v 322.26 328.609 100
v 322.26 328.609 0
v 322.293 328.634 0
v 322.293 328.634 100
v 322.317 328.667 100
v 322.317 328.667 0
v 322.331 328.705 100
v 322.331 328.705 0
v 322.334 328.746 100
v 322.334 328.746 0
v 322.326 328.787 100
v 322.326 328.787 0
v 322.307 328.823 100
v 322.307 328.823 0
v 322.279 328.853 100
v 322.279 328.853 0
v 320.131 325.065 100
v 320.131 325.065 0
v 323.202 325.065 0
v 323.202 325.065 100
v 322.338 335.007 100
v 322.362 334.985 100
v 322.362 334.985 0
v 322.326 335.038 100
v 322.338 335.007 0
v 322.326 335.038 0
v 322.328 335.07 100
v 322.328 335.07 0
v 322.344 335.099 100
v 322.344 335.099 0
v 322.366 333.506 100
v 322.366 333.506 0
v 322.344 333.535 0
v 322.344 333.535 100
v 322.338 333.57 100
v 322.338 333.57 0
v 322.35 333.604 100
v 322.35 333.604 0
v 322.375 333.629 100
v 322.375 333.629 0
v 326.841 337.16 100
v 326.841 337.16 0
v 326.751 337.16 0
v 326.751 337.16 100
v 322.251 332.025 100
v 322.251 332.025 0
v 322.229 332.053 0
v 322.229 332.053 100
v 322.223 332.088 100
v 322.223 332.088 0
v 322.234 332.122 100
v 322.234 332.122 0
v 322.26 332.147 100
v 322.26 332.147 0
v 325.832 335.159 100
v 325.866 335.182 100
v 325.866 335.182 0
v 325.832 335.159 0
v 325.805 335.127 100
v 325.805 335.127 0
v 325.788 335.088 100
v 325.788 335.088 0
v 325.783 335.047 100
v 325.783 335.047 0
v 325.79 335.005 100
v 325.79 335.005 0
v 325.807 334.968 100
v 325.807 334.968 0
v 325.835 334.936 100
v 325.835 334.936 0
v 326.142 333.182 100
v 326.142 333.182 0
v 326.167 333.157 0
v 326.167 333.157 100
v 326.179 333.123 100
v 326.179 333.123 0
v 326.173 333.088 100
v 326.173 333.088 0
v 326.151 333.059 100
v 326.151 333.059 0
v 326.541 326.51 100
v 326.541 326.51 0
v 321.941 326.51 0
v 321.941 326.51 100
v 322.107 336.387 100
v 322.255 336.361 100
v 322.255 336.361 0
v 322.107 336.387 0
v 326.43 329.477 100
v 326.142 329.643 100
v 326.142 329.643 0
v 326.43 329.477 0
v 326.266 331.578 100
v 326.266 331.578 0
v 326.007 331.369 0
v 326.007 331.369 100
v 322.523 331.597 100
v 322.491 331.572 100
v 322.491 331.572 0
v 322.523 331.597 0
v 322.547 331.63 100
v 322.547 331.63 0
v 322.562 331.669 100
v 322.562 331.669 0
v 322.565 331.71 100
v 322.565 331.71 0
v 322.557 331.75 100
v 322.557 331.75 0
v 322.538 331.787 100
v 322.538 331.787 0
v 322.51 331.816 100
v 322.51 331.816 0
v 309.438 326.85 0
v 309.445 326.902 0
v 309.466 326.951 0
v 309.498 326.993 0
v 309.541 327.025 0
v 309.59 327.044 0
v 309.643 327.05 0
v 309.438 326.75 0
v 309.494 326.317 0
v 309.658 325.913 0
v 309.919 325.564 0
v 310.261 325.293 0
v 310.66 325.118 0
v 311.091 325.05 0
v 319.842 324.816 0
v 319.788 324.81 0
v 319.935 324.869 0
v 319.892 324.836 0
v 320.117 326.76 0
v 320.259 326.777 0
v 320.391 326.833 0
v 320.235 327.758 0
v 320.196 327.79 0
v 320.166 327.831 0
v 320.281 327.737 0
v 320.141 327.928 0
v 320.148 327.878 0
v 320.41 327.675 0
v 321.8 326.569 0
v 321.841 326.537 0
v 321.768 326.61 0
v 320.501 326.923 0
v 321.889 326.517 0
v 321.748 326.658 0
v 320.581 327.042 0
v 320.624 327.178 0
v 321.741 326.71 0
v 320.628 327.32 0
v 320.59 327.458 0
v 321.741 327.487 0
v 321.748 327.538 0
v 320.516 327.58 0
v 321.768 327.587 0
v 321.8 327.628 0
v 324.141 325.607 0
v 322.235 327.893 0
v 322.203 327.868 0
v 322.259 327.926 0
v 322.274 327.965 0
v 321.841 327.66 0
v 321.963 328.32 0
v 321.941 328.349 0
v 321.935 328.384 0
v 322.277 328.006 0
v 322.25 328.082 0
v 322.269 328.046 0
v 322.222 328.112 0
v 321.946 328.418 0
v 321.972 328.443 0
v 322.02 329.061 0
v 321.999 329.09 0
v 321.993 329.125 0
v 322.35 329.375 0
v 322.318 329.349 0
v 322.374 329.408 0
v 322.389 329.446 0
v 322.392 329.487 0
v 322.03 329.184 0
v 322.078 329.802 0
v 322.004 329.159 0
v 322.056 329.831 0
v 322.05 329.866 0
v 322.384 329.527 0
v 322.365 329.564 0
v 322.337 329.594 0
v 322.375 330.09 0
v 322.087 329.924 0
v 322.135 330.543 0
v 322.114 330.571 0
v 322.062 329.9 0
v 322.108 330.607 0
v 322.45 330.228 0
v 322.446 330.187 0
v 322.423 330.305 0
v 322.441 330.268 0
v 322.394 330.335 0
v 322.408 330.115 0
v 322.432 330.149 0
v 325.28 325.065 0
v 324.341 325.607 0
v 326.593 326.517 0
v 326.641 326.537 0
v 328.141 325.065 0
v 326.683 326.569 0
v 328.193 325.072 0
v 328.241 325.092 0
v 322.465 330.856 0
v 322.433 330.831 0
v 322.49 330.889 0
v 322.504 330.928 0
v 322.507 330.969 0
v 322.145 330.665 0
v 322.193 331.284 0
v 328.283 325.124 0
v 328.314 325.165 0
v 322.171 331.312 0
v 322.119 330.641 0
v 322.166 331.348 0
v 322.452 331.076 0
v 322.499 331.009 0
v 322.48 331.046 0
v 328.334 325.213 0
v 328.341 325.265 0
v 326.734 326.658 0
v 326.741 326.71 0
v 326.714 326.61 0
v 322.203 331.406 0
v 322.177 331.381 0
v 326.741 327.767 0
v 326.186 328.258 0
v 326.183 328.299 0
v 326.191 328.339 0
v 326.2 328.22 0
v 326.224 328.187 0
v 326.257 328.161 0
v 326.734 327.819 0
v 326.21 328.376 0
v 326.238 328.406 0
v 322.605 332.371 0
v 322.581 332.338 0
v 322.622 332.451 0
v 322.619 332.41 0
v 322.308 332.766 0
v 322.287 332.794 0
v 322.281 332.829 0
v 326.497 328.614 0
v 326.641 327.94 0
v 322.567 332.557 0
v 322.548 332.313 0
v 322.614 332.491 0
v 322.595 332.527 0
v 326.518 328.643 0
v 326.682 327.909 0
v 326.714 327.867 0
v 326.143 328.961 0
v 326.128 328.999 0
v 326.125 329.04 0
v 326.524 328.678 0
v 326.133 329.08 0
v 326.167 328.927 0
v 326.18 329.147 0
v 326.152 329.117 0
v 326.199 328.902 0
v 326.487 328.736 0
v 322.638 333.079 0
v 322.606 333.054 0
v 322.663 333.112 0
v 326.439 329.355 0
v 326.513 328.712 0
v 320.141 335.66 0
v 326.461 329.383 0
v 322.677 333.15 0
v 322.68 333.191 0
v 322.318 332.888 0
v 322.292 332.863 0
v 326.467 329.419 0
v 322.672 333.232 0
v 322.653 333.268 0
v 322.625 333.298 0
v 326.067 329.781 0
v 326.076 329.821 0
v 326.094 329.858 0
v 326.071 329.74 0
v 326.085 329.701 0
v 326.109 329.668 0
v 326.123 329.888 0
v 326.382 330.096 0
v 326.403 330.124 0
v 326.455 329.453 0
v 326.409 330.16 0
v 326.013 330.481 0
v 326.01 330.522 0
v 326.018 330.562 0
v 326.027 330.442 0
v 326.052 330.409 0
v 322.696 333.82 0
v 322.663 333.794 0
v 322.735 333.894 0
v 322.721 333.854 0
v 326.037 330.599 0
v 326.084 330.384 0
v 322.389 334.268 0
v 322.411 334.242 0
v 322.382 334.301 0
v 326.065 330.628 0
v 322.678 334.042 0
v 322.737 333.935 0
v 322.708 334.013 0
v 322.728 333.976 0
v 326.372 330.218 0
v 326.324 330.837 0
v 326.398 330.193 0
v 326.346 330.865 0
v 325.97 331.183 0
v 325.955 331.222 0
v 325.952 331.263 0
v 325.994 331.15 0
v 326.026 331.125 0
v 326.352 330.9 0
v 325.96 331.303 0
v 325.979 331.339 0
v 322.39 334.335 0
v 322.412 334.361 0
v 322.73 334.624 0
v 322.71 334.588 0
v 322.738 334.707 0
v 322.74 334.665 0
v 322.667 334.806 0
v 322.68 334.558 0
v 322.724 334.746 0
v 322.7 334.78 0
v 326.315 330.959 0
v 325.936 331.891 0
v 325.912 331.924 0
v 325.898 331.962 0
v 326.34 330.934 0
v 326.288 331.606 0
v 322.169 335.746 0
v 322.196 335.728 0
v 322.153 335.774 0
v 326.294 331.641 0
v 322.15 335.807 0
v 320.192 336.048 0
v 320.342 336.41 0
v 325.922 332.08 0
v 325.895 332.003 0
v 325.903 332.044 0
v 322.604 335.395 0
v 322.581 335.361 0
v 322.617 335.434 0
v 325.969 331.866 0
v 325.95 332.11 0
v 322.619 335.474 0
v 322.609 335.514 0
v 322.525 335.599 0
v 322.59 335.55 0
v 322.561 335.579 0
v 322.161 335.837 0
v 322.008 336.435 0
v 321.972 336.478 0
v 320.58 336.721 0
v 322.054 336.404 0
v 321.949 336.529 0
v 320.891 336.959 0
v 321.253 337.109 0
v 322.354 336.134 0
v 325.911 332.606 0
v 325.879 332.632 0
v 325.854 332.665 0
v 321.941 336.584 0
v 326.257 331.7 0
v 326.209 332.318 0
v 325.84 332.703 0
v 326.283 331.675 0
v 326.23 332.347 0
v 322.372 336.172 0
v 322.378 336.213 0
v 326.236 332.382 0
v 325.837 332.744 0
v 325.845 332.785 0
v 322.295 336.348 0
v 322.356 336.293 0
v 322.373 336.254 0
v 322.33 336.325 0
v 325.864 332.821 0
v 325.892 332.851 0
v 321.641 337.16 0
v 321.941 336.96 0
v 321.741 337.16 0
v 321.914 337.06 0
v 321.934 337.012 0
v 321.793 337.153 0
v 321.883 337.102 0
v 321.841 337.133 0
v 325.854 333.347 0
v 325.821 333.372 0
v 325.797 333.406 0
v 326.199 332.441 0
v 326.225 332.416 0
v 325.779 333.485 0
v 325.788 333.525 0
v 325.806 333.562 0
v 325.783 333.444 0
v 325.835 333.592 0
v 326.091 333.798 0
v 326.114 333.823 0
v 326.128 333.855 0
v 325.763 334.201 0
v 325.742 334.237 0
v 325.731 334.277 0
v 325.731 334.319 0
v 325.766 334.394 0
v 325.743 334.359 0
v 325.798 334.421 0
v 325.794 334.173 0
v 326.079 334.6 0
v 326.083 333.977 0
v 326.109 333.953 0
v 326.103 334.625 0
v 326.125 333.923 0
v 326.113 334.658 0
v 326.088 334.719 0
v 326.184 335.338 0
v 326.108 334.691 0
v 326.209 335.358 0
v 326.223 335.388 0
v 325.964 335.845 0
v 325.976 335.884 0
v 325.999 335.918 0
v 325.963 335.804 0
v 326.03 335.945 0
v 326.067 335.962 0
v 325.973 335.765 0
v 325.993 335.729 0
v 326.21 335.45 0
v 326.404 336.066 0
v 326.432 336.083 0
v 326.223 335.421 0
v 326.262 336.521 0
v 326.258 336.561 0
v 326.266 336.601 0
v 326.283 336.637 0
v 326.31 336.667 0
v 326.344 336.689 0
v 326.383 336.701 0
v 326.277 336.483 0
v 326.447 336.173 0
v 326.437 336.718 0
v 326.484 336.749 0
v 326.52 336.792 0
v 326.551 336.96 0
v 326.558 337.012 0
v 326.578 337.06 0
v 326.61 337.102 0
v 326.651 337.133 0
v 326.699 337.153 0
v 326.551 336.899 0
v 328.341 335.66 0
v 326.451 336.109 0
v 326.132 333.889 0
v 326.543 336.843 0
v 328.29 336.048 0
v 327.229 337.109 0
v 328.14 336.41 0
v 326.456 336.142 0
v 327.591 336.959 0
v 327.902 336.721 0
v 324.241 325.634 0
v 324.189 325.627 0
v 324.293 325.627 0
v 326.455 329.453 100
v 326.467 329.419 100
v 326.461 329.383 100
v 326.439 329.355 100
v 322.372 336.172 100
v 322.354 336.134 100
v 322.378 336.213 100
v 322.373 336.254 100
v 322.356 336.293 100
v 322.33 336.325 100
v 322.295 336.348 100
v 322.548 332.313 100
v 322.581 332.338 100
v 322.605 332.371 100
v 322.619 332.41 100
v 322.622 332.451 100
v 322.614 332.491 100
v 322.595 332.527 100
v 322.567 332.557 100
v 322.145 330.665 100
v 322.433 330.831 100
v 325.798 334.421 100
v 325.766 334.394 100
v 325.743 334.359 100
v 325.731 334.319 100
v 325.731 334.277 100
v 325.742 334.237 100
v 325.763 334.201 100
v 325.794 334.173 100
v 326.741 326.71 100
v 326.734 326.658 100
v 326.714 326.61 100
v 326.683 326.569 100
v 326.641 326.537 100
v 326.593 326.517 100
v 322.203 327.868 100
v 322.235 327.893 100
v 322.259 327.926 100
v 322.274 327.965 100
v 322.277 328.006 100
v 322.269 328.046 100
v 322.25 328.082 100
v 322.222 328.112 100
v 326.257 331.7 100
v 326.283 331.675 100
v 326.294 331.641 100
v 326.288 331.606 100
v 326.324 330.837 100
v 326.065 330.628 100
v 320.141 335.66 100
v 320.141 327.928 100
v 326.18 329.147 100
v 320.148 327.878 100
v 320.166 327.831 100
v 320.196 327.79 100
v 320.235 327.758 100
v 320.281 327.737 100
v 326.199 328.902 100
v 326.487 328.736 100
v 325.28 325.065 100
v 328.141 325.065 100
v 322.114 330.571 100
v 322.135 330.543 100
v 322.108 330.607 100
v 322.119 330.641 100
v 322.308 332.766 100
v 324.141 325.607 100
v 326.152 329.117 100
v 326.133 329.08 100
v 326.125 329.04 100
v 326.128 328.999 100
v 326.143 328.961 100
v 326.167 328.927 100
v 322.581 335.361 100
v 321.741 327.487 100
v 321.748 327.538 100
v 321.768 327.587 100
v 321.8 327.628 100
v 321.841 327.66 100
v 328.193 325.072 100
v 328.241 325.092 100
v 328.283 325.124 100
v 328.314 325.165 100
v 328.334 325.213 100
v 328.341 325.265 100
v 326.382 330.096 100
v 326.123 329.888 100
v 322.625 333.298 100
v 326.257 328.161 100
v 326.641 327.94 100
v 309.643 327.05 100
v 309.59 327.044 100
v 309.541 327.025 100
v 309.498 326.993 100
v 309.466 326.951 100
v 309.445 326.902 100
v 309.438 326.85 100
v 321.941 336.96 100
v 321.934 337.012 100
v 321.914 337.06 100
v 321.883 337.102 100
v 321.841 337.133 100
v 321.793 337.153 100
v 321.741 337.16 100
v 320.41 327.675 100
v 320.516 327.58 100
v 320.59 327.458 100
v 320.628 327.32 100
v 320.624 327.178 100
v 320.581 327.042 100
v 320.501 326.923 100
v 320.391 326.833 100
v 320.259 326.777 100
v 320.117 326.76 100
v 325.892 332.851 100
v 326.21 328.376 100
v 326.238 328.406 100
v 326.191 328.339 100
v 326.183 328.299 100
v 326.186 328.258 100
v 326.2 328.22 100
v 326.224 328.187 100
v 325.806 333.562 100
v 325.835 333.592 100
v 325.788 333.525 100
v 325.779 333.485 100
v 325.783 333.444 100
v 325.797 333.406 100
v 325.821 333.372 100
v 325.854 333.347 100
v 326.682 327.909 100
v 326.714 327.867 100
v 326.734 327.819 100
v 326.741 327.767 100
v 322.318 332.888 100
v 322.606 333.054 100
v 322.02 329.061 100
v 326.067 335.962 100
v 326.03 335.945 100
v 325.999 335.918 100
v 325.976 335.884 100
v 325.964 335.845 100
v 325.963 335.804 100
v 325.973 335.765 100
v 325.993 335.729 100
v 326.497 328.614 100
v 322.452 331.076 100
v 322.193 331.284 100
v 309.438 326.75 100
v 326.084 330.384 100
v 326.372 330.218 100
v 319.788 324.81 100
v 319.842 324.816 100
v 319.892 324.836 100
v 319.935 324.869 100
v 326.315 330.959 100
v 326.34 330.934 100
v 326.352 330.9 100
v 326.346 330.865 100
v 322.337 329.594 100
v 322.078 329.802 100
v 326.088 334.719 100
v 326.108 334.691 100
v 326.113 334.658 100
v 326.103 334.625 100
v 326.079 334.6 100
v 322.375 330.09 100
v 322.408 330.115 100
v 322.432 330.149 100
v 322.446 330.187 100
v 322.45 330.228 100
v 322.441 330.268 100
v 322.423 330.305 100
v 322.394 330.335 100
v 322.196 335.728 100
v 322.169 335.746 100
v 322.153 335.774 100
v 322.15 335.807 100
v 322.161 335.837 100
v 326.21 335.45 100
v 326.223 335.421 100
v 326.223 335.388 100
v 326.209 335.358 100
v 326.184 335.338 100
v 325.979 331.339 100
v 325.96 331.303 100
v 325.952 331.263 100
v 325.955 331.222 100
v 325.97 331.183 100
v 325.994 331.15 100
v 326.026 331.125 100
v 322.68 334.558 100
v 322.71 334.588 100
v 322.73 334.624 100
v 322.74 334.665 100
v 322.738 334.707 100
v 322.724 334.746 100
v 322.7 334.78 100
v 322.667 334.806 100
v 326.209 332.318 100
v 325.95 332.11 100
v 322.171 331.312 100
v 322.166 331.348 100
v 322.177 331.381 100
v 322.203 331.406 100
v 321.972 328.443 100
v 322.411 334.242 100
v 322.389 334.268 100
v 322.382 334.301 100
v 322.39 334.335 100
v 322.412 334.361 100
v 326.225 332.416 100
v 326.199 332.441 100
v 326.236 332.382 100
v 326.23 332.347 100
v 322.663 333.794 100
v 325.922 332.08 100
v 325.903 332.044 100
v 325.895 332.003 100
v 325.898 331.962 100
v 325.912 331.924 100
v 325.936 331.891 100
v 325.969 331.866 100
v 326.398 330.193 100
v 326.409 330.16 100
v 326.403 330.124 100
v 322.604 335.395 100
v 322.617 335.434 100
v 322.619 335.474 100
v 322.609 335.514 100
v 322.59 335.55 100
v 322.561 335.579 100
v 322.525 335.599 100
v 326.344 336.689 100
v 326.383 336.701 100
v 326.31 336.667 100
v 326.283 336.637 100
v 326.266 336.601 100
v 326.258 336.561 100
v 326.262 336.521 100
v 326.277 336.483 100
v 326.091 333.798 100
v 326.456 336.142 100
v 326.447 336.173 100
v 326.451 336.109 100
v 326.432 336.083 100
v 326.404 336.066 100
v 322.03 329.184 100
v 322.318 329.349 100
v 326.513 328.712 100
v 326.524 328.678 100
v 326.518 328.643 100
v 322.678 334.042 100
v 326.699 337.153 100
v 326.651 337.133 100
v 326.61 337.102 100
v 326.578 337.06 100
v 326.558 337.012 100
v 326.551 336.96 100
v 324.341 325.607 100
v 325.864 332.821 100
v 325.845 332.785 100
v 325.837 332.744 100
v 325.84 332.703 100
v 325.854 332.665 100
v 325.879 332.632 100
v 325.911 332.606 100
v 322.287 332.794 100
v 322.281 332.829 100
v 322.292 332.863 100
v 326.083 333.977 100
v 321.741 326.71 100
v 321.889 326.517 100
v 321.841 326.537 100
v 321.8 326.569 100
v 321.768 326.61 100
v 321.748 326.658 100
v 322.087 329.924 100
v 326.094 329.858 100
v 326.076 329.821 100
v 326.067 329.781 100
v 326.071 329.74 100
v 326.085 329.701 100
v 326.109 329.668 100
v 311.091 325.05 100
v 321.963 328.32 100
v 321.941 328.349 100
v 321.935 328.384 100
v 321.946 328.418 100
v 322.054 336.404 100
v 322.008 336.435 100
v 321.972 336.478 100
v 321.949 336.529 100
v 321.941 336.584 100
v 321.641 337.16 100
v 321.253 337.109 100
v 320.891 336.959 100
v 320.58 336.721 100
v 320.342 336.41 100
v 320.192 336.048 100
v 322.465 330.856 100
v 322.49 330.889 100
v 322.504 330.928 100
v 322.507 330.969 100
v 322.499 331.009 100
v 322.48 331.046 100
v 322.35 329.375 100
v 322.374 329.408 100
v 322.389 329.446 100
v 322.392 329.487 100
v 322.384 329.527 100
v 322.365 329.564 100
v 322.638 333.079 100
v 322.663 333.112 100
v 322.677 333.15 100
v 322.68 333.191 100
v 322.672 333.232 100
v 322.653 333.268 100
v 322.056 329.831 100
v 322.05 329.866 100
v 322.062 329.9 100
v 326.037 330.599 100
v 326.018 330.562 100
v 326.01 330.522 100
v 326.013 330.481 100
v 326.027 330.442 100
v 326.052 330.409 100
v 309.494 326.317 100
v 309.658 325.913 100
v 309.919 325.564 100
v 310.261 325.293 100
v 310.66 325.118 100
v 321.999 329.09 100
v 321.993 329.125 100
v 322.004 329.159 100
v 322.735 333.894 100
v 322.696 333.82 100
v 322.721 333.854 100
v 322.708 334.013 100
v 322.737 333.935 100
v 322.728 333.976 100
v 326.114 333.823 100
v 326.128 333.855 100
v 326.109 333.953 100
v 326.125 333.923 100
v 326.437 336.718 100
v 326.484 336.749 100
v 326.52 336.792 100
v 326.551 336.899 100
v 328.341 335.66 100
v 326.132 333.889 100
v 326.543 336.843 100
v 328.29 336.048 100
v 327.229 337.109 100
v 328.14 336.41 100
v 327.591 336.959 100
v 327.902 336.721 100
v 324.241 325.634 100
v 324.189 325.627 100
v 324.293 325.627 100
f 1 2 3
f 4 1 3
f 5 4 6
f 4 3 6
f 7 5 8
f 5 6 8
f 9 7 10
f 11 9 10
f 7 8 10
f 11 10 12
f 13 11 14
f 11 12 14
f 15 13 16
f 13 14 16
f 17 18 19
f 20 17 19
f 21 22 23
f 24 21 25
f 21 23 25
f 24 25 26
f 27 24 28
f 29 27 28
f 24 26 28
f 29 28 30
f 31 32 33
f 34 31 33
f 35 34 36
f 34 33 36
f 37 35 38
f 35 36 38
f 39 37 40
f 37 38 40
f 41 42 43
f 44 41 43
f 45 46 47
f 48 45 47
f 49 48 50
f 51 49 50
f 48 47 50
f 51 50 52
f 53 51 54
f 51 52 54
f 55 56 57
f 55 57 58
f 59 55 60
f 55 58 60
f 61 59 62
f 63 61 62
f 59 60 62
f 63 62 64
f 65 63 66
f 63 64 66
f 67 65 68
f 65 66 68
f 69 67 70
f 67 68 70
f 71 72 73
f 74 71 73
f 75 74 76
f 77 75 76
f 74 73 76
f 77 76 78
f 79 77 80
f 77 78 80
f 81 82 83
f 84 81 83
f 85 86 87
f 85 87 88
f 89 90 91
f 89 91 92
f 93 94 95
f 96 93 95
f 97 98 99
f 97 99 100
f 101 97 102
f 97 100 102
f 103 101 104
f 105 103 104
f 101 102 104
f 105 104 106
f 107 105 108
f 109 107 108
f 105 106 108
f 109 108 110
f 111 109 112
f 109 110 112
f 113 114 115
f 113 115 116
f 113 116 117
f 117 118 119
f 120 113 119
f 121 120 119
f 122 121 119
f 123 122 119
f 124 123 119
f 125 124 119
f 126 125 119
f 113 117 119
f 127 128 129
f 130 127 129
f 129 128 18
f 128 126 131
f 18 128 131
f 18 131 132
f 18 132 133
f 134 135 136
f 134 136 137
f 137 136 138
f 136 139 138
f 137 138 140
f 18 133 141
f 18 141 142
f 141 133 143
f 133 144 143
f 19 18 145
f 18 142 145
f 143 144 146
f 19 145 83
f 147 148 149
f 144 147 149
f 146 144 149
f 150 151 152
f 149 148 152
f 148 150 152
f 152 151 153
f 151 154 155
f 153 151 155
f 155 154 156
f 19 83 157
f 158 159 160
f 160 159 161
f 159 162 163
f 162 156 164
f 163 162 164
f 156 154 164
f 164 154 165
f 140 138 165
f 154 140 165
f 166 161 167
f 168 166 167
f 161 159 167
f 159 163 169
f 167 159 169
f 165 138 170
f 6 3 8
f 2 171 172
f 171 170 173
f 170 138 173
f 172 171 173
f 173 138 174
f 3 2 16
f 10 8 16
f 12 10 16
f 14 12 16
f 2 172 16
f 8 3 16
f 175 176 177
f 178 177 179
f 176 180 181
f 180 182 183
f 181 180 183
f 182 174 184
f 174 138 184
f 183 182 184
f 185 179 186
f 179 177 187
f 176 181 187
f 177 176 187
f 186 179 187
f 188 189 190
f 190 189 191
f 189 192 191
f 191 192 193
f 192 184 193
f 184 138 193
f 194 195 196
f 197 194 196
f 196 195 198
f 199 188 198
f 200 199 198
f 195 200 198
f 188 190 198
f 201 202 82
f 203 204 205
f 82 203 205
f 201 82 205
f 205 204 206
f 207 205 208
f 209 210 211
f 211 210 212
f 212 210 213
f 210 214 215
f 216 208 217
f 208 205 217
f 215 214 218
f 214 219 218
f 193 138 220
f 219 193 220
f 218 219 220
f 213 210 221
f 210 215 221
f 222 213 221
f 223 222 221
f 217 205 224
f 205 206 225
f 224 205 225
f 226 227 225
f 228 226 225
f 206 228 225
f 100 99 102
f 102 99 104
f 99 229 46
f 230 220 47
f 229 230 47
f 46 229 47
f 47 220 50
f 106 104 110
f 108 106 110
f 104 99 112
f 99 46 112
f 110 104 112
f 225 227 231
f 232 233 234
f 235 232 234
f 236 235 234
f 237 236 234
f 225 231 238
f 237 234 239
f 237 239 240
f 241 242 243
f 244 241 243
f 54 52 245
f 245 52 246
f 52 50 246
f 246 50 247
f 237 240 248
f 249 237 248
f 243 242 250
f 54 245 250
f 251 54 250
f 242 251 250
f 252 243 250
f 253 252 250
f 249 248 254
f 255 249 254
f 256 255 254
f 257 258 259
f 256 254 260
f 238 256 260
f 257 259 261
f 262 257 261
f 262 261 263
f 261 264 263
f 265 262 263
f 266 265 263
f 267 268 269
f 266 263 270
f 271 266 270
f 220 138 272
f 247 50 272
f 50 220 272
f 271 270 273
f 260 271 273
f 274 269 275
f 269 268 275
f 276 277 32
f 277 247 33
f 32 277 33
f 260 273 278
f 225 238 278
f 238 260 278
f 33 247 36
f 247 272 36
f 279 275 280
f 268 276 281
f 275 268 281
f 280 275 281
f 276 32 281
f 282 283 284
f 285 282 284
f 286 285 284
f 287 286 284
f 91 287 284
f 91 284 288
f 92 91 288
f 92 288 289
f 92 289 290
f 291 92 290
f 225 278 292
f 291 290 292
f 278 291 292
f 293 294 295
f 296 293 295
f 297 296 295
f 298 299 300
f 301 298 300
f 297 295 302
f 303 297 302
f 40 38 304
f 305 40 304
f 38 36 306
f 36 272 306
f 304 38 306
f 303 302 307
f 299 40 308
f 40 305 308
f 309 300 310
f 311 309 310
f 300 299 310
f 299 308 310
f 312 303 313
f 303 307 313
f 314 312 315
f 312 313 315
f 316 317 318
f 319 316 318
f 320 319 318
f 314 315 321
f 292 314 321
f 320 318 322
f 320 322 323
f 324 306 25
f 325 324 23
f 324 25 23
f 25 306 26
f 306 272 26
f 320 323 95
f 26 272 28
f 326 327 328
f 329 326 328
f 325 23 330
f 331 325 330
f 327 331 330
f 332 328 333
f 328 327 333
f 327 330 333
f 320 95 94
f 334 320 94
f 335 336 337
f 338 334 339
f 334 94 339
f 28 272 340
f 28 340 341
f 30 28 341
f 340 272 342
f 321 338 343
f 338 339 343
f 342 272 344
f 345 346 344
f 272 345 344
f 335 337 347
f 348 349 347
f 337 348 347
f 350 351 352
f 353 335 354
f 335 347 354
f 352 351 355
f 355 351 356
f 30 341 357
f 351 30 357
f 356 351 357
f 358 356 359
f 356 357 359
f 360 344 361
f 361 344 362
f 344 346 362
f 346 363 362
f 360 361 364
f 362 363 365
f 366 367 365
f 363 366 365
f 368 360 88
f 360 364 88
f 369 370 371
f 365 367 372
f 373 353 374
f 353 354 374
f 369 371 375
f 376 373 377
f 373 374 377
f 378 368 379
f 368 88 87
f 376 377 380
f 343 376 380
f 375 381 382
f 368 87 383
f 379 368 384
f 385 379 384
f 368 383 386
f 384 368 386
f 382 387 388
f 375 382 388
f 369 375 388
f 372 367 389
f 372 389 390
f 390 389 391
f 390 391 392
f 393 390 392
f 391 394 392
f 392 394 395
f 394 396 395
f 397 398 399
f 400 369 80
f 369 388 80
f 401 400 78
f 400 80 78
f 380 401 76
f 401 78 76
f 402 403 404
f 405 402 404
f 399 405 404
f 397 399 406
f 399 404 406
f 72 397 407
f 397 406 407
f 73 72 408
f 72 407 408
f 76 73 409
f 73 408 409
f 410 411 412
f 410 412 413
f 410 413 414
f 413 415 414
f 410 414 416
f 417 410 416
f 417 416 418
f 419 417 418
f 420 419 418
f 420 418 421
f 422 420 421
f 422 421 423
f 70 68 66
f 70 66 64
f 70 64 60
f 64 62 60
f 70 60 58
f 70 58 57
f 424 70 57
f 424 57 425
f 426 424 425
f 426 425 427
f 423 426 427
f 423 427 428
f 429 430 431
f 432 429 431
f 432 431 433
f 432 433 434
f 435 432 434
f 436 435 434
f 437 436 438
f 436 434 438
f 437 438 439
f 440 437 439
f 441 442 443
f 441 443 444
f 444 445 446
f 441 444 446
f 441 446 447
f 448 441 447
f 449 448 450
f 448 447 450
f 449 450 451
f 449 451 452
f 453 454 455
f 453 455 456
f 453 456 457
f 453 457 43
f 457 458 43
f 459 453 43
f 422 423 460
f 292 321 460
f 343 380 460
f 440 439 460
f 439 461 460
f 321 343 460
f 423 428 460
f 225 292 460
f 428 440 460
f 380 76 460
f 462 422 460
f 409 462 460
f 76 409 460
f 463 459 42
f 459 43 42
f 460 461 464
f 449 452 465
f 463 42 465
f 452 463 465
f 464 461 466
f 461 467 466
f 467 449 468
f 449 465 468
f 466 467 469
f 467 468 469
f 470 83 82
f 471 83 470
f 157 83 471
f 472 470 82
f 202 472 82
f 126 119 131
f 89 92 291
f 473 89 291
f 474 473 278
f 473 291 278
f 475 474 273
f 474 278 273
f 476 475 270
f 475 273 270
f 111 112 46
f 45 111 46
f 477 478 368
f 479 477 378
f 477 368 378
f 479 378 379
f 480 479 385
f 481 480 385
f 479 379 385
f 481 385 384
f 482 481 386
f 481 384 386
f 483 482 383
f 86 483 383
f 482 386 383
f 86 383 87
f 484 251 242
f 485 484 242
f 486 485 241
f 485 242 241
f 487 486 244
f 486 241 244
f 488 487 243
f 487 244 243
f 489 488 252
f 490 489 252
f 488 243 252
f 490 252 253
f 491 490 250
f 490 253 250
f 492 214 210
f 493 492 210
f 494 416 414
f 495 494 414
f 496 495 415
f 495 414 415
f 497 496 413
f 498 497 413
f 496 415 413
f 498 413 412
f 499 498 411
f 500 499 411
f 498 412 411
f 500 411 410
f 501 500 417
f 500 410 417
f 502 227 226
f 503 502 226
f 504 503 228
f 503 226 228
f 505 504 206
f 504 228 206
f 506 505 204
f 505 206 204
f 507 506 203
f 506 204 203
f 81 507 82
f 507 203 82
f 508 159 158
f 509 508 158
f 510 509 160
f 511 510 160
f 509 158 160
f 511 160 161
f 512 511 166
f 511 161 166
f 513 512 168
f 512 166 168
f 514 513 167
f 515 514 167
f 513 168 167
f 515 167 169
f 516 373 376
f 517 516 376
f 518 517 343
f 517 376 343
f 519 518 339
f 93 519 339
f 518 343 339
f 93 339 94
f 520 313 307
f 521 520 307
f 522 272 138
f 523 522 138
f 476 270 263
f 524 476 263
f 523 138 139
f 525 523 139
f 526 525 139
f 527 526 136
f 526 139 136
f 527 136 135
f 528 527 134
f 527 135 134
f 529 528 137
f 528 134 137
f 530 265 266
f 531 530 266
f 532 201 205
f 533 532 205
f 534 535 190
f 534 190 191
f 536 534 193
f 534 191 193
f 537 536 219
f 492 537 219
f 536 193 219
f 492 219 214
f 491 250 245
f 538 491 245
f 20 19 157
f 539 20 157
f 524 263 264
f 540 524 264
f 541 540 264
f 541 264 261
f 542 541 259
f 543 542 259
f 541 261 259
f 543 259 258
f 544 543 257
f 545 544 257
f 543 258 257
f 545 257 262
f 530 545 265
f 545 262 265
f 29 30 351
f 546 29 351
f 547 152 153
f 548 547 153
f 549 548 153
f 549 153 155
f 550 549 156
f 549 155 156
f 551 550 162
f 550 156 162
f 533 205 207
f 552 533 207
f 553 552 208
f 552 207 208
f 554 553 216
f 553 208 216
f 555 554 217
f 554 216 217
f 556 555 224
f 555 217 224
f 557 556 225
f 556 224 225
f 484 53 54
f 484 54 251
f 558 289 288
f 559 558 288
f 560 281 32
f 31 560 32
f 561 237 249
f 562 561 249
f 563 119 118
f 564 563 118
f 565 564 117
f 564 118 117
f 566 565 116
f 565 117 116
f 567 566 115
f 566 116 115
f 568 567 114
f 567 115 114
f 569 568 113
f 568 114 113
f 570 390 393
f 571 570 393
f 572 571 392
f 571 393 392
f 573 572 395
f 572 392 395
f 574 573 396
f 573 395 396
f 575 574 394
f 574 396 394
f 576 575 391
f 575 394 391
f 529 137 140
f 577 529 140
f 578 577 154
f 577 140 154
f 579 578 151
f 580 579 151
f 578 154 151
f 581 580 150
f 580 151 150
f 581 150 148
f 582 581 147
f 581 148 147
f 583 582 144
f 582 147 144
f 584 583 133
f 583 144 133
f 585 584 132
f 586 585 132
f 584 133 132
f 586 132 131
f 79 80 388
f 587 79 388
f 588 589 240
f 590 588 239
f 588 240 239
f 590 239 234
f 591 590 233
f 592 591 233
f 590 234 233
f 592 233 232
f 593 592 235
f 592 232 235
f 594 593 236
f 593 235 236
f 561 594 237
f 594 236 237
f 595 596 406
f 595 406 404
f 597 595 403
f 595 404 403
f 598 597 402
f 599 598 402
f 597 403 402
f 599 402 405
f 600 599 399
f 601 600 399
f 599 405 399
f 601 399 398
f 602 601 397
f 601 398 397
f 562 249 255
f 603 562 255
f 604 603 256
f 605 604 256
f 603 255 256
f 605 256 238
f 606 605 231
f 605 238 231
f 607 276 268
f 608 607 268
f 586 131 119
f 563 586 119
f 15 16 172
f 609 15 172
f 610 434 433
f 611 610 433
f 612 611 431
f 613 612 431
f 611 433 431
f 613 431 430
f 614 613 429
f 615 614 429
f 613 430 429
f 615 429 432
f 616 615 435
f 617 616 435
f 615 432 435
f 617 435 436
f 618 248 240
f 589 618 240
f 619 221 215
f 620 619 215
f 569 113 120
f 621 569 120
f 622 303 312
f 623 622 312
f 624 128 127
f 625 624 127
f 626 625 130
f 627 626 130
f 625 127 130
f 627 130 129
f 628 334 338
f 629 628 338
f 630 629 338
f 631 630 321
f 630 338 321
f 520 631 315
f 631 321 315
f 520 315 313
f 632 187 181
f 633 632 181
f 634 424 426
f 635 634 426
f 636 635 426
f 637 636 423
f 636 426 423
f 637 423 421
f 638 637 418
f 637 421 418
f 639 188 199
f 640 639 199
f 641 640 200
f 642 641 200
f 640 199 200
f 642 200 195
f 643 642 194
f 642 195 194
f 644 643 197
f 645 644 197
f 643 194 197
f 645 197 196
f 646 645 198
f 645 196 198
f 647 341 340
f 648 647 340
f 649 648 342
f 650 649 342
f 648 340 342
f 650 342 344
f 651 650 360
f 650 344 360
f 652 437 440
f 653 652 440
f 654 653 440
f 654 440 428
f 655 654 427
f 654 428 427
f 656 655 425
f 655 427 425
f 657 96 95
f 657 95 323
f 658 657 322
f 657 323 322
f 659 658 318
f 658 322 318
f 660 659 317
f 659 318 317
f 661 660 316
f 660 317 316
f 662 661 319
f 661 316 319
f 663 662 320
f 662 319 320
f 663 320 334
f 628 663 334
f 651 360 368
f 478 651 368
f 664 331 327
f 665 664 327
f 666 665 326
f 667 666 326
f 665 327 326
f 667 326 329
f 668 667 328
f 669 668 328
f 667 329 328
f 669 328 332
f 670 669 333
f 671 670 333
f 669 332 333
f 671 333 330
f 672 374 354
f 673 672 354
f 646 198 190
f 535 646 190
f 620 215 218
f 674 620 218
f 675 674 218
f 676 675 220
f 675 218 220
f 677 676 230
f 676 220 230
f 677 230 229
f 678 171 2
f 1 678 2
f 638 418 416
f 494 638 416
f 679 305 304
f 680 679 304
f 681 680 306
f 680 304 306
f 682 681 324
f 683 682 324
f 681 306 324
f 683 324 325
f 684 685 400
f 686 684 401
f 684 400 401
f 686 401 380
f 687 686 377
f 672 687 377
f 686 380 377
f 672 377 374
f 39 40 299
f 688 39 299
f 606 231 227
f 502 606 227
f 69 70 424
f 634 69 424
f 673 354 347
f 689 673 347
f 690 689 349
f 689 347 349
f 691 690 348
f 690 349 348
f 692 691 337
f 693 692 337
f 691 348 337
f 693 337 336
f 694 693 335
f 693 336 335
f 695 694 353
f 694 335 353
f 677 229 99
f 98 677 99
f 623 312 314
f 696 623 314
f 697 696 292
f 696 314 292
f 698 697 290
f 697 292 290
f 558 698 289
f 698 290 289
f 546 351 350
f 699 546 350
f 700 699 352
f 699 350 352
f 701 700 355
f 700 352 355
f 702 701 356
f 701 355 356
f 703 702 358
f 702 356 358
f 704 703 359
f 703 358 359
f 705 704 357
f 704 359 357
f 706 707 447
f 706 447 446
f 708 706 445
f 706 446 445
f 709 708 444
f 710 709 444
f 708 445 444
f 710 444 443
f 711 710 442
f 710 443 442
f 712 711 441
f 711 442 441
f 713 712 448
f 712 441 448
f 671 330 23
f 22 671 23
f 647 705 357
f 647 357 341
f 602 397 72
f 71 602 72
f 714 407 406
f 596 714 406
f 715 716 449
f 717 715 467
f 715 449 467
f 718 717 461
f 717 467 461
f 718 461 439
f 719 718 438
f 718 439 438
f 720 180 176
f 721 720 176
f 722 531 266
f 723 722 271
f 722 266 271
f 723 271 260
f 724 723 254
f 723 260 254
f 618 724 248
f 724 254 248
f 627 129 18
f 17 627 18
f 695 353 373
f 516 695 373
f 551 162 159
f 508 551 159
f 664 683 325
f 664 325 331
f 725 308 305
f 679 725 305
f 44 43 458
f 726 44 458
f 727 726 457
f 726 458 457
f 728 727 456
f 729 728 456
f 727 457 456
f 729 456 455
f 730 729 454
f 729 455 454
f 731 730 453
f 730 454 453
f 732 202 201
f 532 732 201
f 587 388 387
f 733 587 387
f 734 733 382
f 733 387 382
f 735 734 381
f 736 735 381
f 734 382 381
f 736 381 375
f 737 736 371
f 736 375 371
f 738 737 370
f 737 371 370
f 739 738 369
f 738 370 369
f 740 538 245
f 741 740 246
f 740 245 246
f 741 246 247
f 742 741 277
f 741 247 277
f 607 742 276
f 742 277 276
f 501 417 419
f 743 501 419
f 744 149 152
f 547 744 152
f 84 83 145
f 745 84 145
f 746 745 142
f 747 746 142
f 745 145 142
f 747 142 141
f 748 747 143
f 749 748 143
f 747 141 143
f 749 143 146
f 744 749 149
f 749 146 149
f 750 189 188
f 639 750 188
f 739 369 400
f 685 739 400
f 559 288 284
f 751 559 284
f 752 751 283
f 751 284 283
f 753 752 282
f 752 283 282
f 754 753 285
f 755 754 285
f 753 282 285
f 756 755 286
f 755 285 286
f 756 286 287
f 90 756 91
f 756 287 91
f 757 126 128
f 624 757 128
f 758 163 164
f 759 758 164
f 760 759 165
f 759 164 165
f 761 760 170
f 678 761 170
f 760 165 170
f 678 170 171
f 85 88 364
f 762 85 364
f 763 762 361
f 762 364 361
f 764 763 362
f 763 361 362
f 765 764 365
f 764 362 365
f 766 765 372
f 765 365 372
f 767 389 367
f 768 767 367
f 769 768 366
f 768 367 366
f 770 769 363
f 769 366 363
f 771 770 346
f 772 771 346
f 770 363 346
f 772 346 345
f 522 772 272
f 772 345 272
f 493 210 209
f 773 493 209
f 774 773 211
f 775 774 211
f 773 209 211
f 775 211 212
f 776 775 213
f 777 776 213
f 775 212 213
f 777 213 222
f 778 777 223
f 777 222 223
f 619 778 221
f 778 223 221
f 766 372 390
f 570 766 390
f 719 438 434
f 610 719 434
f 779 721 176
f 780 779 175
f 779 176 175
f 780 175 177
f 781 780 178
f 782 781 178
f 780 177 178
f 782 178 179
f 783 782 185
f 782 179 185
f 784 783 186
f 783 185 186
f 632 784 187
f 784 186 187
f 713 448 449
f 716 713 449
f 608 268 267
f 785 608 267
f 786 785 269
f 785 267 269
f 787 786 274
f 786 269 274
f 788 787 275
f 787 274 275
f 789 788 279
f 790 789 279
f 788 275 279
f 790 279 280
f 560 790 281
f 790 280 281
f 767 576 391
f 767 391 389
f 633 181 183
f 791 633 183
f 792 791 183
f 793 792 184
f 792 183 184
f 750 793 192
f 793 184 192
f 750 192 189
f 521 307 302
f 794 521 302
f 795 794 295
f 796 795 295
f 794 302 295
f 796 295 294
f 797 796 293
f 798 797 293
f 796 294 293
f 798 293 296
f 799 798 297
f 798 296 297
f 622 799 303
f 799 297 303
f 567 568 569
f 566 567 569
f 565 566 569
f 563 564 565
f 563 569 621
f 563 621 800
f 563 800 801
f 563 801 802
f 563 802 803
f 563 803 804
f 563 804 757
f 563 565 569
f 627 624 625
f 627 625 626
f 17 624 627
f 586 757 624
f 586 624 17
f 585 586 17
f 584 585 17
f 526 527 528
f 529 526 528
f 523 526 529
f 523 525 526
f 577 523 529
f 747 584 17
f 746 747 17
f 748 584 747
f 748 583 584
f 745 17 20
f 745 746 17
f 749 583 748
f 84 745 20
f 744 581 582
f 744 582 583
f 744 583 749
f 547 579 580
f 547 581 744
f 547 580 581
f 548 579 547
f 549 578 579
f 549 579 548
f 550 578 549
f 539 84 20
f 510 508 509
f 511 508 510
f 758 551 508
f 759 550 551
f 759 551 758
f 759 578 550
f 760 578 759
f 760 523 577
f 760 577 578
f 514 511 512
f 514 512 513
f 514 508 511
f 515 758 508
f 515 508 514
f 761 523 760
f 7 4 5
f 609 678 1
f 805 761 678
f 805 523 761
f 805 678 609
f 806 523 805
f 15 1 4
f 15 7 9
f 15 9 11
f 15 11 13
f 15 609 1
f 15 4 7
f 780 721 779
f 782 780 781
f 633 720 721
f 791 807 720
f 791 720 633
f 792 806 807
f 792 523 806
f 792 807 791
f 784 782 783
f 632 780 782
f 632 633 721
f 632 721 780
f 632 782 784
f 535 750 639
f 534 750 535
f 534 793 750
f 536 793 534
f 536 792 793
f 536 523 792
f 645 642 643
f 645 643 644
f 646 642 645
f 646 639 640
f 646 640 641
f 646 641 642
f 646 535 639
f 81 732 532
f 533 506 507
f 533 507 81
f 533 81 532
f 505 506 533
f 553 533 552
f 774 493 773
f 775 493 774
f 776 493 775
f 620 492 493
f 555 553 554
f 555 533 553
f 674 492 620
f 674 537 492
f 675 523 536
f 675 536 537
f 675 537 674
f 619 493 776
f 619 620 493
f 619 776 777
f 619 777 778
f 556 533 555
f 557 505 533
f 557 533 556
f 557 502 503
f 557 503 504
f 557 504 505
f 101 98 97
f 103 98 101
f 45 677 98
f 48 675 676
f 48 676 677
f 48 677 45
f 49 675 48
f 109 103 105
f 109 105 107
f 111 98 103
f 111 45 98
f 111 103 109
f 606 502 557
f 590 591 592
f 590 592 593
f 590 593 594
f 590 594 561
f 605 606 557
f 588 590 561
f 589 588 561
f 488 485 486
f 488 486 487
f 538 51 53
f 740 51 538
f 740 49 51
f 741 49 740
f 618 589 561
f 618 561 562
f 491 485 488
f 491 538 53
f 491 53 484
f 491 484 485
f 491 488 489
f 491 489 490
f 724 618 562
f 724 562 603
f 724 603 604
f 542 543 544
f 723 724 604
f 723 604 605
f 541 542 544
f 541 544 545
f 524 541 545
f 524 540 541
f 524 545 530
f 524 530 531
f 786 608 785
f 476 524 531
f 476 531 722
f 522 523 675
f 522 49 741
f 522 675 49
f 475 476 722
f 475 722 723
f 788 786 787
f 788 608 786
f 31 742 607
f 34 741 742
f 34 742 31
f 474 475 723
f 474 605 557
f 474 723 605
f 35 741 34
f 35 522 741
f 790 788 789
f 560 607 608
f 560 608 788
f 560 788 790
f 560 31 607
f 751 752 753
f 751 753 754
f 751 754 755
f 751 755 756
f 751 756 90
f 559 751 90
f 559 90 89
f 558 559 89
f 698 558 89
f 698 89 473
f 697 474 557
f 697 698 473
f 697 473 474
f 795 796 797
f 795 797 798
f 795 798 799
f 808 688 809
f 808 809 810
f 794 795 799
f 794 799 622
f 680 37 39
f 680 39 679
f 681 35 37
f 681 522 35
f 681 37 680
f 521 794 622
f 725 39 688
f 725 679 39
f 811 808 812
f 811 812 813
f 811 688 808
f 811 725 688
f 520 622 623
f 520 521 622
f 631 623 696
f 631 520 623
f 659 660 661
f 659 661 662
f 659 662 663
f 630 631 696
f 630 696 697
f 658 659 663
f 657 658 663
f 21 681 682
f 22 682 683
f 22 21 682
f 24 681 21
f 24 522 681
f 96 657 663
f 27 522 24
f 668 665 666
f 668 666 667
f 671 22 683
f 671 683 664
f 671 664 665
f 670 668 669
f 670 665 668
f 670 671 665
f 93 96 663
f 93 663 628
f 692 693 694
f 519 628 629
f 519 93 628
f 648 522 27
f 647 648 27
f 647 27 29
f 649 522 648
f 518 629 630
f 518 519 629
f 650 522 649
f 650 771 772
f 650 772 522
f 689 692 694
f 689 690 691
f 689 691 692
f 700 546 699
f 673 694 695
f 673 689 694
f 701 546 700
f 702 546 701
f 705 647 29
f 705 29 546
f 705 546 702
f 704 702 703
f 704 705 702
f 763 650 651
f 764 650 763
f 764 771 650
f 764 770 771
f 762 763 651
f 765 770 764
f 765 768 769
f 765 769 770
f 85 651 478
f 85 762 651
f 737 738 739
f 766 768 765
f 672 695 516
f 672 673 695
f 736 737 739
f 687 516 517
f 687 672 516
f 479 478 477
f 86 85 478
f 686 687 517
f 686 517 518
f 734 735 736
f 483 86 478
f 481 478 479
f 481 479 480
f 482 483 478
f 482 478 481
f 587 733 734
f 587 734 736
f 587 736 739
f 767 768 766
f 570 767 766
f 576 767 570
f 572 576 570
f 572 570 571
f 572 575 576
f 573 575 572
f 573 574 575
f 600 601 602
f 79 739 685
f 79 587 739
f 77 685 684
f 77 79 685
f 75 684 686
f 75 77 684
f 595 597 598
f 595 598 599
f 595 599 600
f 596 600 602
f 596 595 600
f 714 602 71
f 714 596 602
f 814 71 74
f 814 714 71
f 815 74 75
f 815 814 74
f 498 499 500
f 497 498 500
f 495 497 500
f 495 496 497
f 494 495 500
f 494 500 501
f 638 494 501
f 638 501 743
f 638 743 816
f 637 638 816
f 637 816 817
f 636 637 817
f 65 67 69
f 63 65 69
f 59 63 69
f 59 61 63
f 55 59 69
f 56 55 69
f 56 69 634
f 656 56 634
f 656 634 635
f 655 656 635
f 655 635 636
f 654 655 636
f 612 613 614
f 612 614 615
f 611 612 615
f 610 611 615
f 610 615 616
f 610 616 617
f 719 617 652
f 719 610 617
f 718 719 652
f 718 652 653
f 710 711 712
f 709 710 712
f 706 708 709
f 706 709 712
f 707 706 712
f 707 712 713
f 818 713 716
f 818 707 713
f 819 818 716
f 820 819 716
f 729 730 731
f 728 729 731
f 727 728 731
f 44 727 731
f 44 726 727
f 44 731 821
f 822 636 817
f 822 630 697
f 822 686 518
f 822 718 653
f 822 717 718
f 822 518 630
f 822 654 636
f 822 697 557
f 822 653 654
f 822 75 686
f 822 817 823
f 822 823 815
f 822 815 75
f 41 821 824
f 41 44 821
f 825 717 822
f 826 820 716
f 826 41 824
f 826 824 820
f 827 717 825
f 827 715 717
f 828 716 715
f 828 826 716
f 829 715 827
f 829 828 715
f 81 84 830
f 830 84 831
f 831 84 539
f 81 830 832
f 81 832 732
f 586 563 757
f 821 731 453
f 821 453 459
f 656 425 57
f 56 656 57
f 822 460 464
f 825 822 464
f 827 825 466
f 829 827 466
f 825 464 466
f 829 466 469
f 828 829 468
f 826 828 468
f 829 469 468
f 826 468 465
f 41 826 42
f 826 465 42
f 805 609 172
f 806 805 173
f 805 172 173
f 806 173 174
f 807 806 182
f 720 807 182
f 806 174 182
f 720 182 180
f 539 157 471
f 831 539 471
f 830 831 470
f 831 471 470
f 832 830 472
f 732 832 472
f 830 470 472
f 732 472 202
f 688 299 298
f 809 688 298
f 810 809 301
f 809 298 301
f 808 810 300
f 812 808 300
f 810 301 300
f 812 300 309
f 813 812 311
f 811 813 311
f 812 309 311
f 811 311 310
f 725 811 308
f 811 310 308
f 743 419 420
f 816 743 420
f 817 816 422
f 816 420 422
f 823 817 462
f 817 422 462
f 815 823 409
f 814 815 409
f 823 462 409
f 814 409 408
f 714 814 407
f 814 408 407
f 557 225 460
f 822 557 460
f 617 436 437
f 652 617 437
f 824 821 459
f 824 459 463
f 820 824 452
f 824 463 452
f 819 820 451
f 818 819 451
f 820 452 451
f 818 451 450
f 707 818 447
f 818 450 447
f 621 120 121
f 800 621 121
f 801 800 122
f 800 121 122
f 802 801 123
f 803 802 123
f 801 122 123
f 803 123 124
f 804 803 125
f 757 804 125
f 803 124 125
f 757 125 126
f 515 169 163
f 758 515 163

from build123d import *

# Parameters (mm, degrees)
EXTRUDE_1_DEPTH = 100


with BuildPart() as part:
    # Эскиз1 → Бобышка-Вытянуть1 (new body)
    with BuildSketch(Plane.XY):
        with BuildLine():
            Line((311.090891371, 325.050300163), (319.788031344, 324.810224137))
            ThreePointArc((319.788031344, 324.810224137), (319.867529895, 324.824333608), (319.934971402, 324.868726626))
            Line((319.934971402, 324.868726626), (320.131212385, 325.064967609))
            Line((320.131212385, 325.064967609), (323.201898914, 325.064967609))
            Line((323.201898914, 325.064967609), (324.141129398, 325.607232582))
            ThreePointArc((324.141129398, 325.607232582), (324.241129398, 325.634027502), (324.341129398, 325.607232582))
            Line((324.341129398, 325.607232582), (325.280359883, 325.064967609))
            Line((325.280359883, 325.064967609), (328.141129398, 325.064967609))
            ThreePointArc((328.141129398, 325.064967609), (328.282550755, 325.123546253), (328.341129398, 325.264967609))
            Line((328.341129398, 325.264967609), (328.341129398, 335.660147982))
            ThreePointArc((328.341129398, 335.660147982), (327.90178957, 336.720808154), (326.841129398, 337.160147982))
            Line((326.841129398, 337.160147982), (326.751018387, 337.160147982))
            ThreePointArc((326.751018387, 337.160147982), (326.609597031, 337.101569338), (326.551018387, 336.960147982))
            Line((326.551018387, 336.960147982), (326.551018387, 336.898541414))
            ThreePointArc((326.551018387, 336.898541414), (326.50335276, 336.768948826), (326.383075998, 336.701127358))
            ThreePointArc((326.383075998, 336.701127358), (326.273318939, 336.619532133), (326.27674616, 336.482811079))
            Line((326.27674616, 336.482811079), (326.447277251, 336.173129229))
            ThreePointArc((326.447277251, 336.173129229), (326.451076485, 336.109455402), (326.40409571, 336.066309172))
            Line((326.40409571, 336.066309172), (326.066600192, 335.962234792))
            ThreePointArc((326.066600192, 335.962234792), (325.96870237, 335.864988428), (325.99301838, 335.729159231))
            Line((325.99301838, 335.729159231), (326.209580677, 335.450169137))
            ThreePointArc((326.209580677, 335.450169137), (326.223272021, 335.387868756), (326.183601656, 335.337918255))
            Line((326.183601656, 335.337918255), (325.866171063, 335.182285611))
            ThreePointArc((325.866171063, 335.182285611), (325.784195666, 335.067661744), (325.834812154, 334.936145328))
            Line((325.834812154, 334.936145328), (326.08754177, 334.719229546))
            ThreePointArc((326.08754177, 334.719229546), (326.113257599, 334.657577201), (326.079055863, 334.600196396))
            Line((326.079055863, 334.600196396), (325.798110573, 334.421326447))
            ThreePointArc((325.798110573, 334.421326447), (325.729347274, 334.298199433), (325.794435238, 334.173090641))
            Line((325.794435238, 334.173090641), (326.083482656, 333.976799787))
            ThreePointArc((326.083482656, 333.976799787), (326.132220057, 333.889114864), (326.090713273, 333.797784875))
            Line((326.090713273, 333.797784875), (325.834605364, 333.591823003))
            ThreePointArc((325.834605364, 333.591823003), (325.779589072, 333.464527861), (325.853621615, 333.347267346))
            Line((325.853621615, 333.347267346), (326.141686948, 333.18153099))
            ThreePointArc((326.141686948, 333.18153099), (326.178703219, 333.122900733), (326.151195073, 333.059253162))
            Line((326.151195073, 333.059253162), (325.892212173, 332.850979224))
            ThreePointArc((325.892212173, 332.850979224), (325.837195882, 332.723684082), (325.911228424, 332.606423567))
            Line((325.911228424, 332.606423567), (326.199293757, 332.440687211))
            ThreePointArc((326.199293757, 332.440687211), (326.236310028, 332.382056954), (326.208801882, 332.318409383))
            Line((326.208801882, 332.318409383), (325.949818982, 332.110135445))
            ThreePointArc((325.949818982, 332.110135445), (325.894802691, 331.982840302), (325.968835233, 331.865579788))
            Line((325.968835233, 331.865579788), (326.256900566, 331.699843432))
            ThreePointArc((326.256900566, 331.699843432), (326.293916837, 331.641213174), (326.266408691, 331.577565603))
            Line((326.266408691, 331.577565603), (326.007425791, 331.369291665))
            ThreePointArc((326.007425791, 331.369291665), (325.9524095, 331.241996523), (326.026442042, 331.124736008))
            Line((326.026442042, 331.124736008), (326.314507375, 330.958999652))
            ThreePointArc((326.314507375, 330.958999652), (326.351523646, 330.900369395), (326.3240155, 330.836721824))
            Line((326.3240155, 330.836721824), (326.0650326, 330.628447886))
            ThreePointArc((326.0650326, 330.628447886), (326.010016309, 330.501152743), (326.084048851, 330.383892229))
            Line((326.084048851, 330.383892229), (326.372114184, 330.218155873))
            ThreePointArc((326.372114184, 330.218155873), (326.409130455, 330.159525616), (326.381622309, 330.095878044))
            Line((326.381622309, 330.095878044), (326.12263941, 329.887604106))
            ThreePointArc((326.12263941, 329.887604106), (326.067623118, 329.760308964), (326.14165566, 329.643048449))
            Line((326.14165566, 329.643048449), (326.429720993, 329.477312094))
            ThreePointArc((326.429720993, 329.477312094), (326.466737264, 329.418681836), (326.439229119, 329.355034265))
            Line((326.439229119, 329.355034265), (326.180246219, 329.146760327))
            ThreePointArc((326.180246219, 329.146760327), (326.125229927, 329.019465185), (326.199262469, 328.90220467))
            Line((326.199262469, 328.90220467), (326.487327802, 328.736468314))
            ThreePointArc((326.487327802, 328.736468314), (326.524344073, 328.677838057), (326.496835928, 328.614190486))
            Line((326.496835928, 328.614190486), (326.237853028, 328.405916548))
            ThreePointArc((326.237853028, 328.405916548), (326.182836736, 328.278621405), (326.256869279, 328.161360891))
            Line((326.256869279, 328.161360891), (326.640868299, 327.940429765))
            ThreePointArc((326.640868299, 327.940429765), (326.71425909, 327.867204665), (326.741129398, 327.767074201))
            Line((326.741129398, 327.767074201), (326.741129398, 326.710147982))
            ThreePointArc((326.741129398, 326.710147982), (326.682550755, 326.568726626), (326.541129398, 326.510147982))
            Line((326.541129398, 326.510147982), (321.941129398, 326.510147982))
            ThreePointArc((321.941129398, 326.510147982), (321.799708042, 326.568726626), (321.741129398, 326.710147982))
            Line((321.741129398, 326.710147982), (321.741129398, 327.486517476))
            ThreePointArc((321.741129398, 327.486517476), (321.767999707, 327.586647941), (321.841390498, 327.659873041))
            Line((321.841390498, 327.659873041), (322.202552193, 327.867664872))
            ThreePointArc((322.202552193, 327.867664872), (322.276584735, 327.984925387), (322.221568443, 328.112220529))
            Line((322.221568443, 328.112220529), (321.962585543, 328.320494467))
            ThreePointArc((321.962585543, 328.320494467), (321.935077398, 328.384142038), (321.972093669, 328.442772296))
            Line((321.972093669, 328.442772296), (322.260159002, 328.608508652))
            ThreePointArc((322.260159002, 328.608508652), (322.334191544, 328.725769166), (322.279175253, 328.853064309))
            Line((322.279175253, 328.853064309), (322.020192353, 329.061338247))
            ThreePointArc((322.020192353, 329.061338247), (321.992684207, 329.124985818), (322.029700478, 329.183616075))
            Line((322.029700478, 329.183616075), (322.317765811, 329.349352431))
            ThreePointArc((322.317765811, 329.349352431), (322.391798353, 329.466612946), (322.336782062, 329.593908088))
            Line((322.336782062, 329.593908088), (322.077799162, 329.802182026))
            ThreePointArc((322.077799162, 329.802182026), (322.050291016, 329.865829597), (322.087307287, 329.924459854))
            Line((322.087307287, 329.924459854), (322.37537262, 330.09019621))
            ThreePointArc((322.37537262, 330.09019621), (322.449405162, 330.207456725), (322.394388871, 330.334751867))
            Line((322.394388871, 330.334751867), (322.135405971, 330.543025805))
            ThreePointArc((322.135405971, 330.543025805), (322.107897825, 330.606673377), (322.144914096, 330.665303634))
            Line((322.144914096, 330.665303634), (322.432979429, 330.83103999))
            ThreePointArc((322.432979429, 330.83103999), (322.507011971, 330.948300504), (322.45199568, 331.075595647))
            Line((322.45199568, 331.075595647), (322.19301278, 331.283869585))
            ThreePointArc((322.19301278, 331.283869585), (322.165504634, 331.347517156), (322.202520905, 331.406147413))
            Line((322.202520905, 331.406147413), (322.490586238, 331.571883769))
            ThreePointArc((322.490586238, 331.571883769), (322.564618781, 331.689144284), (322.509602489, 331.816439426))
            Line((322.509602489, 331.816439426), (322.250619589, 332.024713364))
            ThreePointArc((322.250619589, 332.024713364), (322.223111443, 332.088360935), (322.260127715, 332.146991193))
            Line((322.260127715, 332.146991193), (322.548193048, 332.312727548))
            ThreePointArc((322.548193048, 332.312727548), (322.62222559, 332.429988063), (322.567209298, 332.557283205))
            Line((322.567209298, 332.557283205), (322.308226398, 332.765557144))
            ThreePointArc((322.308226398, 332.765557144), (322.280718253, 332.829204715), (322.317734524, 332.887834972))
            Line((322.317734524, 332.887834972), (322.605799857, 333.053571328))
            ThreePointArc((322.605799857, 333.053571328), (322.679832399, 333.170831842), (322.624816107, 333.298126985))
            Line((322.624816107, 333.298126985), (322.365833207, 333.506400923))
            ThreePointArc((322.365833207, 333.506400923), (322.338325062, 333.570048494), (322.375341333, 333.628678751))
            Line((322.375341333, 333.628678751), (322.663406666, 333.794415107))
            ThreePointArc((322.663406666, 333.794415107), (322.737622, 333.914334818), (322.678209577, 334.042236409))
            Line((322.678209577, 334.042236409), (322.411350306, 334.241512209))
            ThreePointArc((322.411350306, 334.241512209), (322.381512328, 334.301278508), (322.411743655, 334.360846808))
            Line((322.411743655, 334.360846808), (322.679910814, 334.558359061))
            ThreePointArc((322.679910814, 334.558359061), (322.740171486, 334.685745276), (322.666950969, 334.806150228))
            Line((322.666950969, 334.806150228), (322.361978717, 334.984967527))
            ThreePointArc((322.361978717, 334.984967527), (322.326134471, 335.037730965), (322.344422849, 335.098840094))
            Line((322.344422849, 335.098840094), (322.581141078, 335.36094538))
            ThreePointArc((322.581141078, 335.36094538), (322.615495018, 335.494589107), (322.525103363, 335.598849299))
            Line((322.525103363, 335.598849299), (322.196285999, 335.727743993))
            ThreePointArc((322.196285999, 335.727743993), (322.152645383, 335.774265892), (322.161171245, 335.837480605))
            Line((322.161171245, 335.837480605), (322.354269218, 336.133617186))
            ThreePointArc((322.354269218, 336.133617186), (322.366051346, 336.274044313), (322.25526952, 336.361141866))
            Line((322.25526952, 336.361141866), (322.106867151, 336.386946327))
            ThreePointArc((322.106867151, 336.386946327), (321.988073119, 336.455250544), (321.941129398, 336.58398972))
            Line((321.941129398, 336.58398972), (321.941129398, 336.960147982))
            ThreePointArc((321.941129398, 336.960147982), (321.882550755, 337.101569338), (321.741129398, 337.160147982))
            Line((321.741129398, 337.160147982), (321.641129398, 337.160147982))
            ThreePointArc((321.641129398, 337.160147982), (320.580469227, 336.720808154), (320.141129398, 335.660147982))
            Line((320.141129398, 335.660147982), (320.141129398, 327.928017713))
            ThreePointArc((320.141129398, 327.928017713), (320.179892433, 327.809684958), (320.281155808, 327.737221569))
            ThreePointArc((320.281155808, 327.737221569), (320.624342386, 327.177574585), (320.117425076, 326.760421597))
            Line((320.117425076, 326.760421597), (309.643319038, 327.04954903))
            ThreePointArc((309.643319038, 327.04954903), (309.498343785, 326.992984419), (309.437800337, 326.849625185))
            Line((309.437800337, 326.849625185), (309.437800337, 326.749652848))
            ThreePointArc((309.437800337, 326.749652848), (309.919246841, 325.564272159), (311.090891371, 325.050300163))
        make_face()
    extrude(amount=EXTRUDE_1_DEPTH)


solid = part.part
